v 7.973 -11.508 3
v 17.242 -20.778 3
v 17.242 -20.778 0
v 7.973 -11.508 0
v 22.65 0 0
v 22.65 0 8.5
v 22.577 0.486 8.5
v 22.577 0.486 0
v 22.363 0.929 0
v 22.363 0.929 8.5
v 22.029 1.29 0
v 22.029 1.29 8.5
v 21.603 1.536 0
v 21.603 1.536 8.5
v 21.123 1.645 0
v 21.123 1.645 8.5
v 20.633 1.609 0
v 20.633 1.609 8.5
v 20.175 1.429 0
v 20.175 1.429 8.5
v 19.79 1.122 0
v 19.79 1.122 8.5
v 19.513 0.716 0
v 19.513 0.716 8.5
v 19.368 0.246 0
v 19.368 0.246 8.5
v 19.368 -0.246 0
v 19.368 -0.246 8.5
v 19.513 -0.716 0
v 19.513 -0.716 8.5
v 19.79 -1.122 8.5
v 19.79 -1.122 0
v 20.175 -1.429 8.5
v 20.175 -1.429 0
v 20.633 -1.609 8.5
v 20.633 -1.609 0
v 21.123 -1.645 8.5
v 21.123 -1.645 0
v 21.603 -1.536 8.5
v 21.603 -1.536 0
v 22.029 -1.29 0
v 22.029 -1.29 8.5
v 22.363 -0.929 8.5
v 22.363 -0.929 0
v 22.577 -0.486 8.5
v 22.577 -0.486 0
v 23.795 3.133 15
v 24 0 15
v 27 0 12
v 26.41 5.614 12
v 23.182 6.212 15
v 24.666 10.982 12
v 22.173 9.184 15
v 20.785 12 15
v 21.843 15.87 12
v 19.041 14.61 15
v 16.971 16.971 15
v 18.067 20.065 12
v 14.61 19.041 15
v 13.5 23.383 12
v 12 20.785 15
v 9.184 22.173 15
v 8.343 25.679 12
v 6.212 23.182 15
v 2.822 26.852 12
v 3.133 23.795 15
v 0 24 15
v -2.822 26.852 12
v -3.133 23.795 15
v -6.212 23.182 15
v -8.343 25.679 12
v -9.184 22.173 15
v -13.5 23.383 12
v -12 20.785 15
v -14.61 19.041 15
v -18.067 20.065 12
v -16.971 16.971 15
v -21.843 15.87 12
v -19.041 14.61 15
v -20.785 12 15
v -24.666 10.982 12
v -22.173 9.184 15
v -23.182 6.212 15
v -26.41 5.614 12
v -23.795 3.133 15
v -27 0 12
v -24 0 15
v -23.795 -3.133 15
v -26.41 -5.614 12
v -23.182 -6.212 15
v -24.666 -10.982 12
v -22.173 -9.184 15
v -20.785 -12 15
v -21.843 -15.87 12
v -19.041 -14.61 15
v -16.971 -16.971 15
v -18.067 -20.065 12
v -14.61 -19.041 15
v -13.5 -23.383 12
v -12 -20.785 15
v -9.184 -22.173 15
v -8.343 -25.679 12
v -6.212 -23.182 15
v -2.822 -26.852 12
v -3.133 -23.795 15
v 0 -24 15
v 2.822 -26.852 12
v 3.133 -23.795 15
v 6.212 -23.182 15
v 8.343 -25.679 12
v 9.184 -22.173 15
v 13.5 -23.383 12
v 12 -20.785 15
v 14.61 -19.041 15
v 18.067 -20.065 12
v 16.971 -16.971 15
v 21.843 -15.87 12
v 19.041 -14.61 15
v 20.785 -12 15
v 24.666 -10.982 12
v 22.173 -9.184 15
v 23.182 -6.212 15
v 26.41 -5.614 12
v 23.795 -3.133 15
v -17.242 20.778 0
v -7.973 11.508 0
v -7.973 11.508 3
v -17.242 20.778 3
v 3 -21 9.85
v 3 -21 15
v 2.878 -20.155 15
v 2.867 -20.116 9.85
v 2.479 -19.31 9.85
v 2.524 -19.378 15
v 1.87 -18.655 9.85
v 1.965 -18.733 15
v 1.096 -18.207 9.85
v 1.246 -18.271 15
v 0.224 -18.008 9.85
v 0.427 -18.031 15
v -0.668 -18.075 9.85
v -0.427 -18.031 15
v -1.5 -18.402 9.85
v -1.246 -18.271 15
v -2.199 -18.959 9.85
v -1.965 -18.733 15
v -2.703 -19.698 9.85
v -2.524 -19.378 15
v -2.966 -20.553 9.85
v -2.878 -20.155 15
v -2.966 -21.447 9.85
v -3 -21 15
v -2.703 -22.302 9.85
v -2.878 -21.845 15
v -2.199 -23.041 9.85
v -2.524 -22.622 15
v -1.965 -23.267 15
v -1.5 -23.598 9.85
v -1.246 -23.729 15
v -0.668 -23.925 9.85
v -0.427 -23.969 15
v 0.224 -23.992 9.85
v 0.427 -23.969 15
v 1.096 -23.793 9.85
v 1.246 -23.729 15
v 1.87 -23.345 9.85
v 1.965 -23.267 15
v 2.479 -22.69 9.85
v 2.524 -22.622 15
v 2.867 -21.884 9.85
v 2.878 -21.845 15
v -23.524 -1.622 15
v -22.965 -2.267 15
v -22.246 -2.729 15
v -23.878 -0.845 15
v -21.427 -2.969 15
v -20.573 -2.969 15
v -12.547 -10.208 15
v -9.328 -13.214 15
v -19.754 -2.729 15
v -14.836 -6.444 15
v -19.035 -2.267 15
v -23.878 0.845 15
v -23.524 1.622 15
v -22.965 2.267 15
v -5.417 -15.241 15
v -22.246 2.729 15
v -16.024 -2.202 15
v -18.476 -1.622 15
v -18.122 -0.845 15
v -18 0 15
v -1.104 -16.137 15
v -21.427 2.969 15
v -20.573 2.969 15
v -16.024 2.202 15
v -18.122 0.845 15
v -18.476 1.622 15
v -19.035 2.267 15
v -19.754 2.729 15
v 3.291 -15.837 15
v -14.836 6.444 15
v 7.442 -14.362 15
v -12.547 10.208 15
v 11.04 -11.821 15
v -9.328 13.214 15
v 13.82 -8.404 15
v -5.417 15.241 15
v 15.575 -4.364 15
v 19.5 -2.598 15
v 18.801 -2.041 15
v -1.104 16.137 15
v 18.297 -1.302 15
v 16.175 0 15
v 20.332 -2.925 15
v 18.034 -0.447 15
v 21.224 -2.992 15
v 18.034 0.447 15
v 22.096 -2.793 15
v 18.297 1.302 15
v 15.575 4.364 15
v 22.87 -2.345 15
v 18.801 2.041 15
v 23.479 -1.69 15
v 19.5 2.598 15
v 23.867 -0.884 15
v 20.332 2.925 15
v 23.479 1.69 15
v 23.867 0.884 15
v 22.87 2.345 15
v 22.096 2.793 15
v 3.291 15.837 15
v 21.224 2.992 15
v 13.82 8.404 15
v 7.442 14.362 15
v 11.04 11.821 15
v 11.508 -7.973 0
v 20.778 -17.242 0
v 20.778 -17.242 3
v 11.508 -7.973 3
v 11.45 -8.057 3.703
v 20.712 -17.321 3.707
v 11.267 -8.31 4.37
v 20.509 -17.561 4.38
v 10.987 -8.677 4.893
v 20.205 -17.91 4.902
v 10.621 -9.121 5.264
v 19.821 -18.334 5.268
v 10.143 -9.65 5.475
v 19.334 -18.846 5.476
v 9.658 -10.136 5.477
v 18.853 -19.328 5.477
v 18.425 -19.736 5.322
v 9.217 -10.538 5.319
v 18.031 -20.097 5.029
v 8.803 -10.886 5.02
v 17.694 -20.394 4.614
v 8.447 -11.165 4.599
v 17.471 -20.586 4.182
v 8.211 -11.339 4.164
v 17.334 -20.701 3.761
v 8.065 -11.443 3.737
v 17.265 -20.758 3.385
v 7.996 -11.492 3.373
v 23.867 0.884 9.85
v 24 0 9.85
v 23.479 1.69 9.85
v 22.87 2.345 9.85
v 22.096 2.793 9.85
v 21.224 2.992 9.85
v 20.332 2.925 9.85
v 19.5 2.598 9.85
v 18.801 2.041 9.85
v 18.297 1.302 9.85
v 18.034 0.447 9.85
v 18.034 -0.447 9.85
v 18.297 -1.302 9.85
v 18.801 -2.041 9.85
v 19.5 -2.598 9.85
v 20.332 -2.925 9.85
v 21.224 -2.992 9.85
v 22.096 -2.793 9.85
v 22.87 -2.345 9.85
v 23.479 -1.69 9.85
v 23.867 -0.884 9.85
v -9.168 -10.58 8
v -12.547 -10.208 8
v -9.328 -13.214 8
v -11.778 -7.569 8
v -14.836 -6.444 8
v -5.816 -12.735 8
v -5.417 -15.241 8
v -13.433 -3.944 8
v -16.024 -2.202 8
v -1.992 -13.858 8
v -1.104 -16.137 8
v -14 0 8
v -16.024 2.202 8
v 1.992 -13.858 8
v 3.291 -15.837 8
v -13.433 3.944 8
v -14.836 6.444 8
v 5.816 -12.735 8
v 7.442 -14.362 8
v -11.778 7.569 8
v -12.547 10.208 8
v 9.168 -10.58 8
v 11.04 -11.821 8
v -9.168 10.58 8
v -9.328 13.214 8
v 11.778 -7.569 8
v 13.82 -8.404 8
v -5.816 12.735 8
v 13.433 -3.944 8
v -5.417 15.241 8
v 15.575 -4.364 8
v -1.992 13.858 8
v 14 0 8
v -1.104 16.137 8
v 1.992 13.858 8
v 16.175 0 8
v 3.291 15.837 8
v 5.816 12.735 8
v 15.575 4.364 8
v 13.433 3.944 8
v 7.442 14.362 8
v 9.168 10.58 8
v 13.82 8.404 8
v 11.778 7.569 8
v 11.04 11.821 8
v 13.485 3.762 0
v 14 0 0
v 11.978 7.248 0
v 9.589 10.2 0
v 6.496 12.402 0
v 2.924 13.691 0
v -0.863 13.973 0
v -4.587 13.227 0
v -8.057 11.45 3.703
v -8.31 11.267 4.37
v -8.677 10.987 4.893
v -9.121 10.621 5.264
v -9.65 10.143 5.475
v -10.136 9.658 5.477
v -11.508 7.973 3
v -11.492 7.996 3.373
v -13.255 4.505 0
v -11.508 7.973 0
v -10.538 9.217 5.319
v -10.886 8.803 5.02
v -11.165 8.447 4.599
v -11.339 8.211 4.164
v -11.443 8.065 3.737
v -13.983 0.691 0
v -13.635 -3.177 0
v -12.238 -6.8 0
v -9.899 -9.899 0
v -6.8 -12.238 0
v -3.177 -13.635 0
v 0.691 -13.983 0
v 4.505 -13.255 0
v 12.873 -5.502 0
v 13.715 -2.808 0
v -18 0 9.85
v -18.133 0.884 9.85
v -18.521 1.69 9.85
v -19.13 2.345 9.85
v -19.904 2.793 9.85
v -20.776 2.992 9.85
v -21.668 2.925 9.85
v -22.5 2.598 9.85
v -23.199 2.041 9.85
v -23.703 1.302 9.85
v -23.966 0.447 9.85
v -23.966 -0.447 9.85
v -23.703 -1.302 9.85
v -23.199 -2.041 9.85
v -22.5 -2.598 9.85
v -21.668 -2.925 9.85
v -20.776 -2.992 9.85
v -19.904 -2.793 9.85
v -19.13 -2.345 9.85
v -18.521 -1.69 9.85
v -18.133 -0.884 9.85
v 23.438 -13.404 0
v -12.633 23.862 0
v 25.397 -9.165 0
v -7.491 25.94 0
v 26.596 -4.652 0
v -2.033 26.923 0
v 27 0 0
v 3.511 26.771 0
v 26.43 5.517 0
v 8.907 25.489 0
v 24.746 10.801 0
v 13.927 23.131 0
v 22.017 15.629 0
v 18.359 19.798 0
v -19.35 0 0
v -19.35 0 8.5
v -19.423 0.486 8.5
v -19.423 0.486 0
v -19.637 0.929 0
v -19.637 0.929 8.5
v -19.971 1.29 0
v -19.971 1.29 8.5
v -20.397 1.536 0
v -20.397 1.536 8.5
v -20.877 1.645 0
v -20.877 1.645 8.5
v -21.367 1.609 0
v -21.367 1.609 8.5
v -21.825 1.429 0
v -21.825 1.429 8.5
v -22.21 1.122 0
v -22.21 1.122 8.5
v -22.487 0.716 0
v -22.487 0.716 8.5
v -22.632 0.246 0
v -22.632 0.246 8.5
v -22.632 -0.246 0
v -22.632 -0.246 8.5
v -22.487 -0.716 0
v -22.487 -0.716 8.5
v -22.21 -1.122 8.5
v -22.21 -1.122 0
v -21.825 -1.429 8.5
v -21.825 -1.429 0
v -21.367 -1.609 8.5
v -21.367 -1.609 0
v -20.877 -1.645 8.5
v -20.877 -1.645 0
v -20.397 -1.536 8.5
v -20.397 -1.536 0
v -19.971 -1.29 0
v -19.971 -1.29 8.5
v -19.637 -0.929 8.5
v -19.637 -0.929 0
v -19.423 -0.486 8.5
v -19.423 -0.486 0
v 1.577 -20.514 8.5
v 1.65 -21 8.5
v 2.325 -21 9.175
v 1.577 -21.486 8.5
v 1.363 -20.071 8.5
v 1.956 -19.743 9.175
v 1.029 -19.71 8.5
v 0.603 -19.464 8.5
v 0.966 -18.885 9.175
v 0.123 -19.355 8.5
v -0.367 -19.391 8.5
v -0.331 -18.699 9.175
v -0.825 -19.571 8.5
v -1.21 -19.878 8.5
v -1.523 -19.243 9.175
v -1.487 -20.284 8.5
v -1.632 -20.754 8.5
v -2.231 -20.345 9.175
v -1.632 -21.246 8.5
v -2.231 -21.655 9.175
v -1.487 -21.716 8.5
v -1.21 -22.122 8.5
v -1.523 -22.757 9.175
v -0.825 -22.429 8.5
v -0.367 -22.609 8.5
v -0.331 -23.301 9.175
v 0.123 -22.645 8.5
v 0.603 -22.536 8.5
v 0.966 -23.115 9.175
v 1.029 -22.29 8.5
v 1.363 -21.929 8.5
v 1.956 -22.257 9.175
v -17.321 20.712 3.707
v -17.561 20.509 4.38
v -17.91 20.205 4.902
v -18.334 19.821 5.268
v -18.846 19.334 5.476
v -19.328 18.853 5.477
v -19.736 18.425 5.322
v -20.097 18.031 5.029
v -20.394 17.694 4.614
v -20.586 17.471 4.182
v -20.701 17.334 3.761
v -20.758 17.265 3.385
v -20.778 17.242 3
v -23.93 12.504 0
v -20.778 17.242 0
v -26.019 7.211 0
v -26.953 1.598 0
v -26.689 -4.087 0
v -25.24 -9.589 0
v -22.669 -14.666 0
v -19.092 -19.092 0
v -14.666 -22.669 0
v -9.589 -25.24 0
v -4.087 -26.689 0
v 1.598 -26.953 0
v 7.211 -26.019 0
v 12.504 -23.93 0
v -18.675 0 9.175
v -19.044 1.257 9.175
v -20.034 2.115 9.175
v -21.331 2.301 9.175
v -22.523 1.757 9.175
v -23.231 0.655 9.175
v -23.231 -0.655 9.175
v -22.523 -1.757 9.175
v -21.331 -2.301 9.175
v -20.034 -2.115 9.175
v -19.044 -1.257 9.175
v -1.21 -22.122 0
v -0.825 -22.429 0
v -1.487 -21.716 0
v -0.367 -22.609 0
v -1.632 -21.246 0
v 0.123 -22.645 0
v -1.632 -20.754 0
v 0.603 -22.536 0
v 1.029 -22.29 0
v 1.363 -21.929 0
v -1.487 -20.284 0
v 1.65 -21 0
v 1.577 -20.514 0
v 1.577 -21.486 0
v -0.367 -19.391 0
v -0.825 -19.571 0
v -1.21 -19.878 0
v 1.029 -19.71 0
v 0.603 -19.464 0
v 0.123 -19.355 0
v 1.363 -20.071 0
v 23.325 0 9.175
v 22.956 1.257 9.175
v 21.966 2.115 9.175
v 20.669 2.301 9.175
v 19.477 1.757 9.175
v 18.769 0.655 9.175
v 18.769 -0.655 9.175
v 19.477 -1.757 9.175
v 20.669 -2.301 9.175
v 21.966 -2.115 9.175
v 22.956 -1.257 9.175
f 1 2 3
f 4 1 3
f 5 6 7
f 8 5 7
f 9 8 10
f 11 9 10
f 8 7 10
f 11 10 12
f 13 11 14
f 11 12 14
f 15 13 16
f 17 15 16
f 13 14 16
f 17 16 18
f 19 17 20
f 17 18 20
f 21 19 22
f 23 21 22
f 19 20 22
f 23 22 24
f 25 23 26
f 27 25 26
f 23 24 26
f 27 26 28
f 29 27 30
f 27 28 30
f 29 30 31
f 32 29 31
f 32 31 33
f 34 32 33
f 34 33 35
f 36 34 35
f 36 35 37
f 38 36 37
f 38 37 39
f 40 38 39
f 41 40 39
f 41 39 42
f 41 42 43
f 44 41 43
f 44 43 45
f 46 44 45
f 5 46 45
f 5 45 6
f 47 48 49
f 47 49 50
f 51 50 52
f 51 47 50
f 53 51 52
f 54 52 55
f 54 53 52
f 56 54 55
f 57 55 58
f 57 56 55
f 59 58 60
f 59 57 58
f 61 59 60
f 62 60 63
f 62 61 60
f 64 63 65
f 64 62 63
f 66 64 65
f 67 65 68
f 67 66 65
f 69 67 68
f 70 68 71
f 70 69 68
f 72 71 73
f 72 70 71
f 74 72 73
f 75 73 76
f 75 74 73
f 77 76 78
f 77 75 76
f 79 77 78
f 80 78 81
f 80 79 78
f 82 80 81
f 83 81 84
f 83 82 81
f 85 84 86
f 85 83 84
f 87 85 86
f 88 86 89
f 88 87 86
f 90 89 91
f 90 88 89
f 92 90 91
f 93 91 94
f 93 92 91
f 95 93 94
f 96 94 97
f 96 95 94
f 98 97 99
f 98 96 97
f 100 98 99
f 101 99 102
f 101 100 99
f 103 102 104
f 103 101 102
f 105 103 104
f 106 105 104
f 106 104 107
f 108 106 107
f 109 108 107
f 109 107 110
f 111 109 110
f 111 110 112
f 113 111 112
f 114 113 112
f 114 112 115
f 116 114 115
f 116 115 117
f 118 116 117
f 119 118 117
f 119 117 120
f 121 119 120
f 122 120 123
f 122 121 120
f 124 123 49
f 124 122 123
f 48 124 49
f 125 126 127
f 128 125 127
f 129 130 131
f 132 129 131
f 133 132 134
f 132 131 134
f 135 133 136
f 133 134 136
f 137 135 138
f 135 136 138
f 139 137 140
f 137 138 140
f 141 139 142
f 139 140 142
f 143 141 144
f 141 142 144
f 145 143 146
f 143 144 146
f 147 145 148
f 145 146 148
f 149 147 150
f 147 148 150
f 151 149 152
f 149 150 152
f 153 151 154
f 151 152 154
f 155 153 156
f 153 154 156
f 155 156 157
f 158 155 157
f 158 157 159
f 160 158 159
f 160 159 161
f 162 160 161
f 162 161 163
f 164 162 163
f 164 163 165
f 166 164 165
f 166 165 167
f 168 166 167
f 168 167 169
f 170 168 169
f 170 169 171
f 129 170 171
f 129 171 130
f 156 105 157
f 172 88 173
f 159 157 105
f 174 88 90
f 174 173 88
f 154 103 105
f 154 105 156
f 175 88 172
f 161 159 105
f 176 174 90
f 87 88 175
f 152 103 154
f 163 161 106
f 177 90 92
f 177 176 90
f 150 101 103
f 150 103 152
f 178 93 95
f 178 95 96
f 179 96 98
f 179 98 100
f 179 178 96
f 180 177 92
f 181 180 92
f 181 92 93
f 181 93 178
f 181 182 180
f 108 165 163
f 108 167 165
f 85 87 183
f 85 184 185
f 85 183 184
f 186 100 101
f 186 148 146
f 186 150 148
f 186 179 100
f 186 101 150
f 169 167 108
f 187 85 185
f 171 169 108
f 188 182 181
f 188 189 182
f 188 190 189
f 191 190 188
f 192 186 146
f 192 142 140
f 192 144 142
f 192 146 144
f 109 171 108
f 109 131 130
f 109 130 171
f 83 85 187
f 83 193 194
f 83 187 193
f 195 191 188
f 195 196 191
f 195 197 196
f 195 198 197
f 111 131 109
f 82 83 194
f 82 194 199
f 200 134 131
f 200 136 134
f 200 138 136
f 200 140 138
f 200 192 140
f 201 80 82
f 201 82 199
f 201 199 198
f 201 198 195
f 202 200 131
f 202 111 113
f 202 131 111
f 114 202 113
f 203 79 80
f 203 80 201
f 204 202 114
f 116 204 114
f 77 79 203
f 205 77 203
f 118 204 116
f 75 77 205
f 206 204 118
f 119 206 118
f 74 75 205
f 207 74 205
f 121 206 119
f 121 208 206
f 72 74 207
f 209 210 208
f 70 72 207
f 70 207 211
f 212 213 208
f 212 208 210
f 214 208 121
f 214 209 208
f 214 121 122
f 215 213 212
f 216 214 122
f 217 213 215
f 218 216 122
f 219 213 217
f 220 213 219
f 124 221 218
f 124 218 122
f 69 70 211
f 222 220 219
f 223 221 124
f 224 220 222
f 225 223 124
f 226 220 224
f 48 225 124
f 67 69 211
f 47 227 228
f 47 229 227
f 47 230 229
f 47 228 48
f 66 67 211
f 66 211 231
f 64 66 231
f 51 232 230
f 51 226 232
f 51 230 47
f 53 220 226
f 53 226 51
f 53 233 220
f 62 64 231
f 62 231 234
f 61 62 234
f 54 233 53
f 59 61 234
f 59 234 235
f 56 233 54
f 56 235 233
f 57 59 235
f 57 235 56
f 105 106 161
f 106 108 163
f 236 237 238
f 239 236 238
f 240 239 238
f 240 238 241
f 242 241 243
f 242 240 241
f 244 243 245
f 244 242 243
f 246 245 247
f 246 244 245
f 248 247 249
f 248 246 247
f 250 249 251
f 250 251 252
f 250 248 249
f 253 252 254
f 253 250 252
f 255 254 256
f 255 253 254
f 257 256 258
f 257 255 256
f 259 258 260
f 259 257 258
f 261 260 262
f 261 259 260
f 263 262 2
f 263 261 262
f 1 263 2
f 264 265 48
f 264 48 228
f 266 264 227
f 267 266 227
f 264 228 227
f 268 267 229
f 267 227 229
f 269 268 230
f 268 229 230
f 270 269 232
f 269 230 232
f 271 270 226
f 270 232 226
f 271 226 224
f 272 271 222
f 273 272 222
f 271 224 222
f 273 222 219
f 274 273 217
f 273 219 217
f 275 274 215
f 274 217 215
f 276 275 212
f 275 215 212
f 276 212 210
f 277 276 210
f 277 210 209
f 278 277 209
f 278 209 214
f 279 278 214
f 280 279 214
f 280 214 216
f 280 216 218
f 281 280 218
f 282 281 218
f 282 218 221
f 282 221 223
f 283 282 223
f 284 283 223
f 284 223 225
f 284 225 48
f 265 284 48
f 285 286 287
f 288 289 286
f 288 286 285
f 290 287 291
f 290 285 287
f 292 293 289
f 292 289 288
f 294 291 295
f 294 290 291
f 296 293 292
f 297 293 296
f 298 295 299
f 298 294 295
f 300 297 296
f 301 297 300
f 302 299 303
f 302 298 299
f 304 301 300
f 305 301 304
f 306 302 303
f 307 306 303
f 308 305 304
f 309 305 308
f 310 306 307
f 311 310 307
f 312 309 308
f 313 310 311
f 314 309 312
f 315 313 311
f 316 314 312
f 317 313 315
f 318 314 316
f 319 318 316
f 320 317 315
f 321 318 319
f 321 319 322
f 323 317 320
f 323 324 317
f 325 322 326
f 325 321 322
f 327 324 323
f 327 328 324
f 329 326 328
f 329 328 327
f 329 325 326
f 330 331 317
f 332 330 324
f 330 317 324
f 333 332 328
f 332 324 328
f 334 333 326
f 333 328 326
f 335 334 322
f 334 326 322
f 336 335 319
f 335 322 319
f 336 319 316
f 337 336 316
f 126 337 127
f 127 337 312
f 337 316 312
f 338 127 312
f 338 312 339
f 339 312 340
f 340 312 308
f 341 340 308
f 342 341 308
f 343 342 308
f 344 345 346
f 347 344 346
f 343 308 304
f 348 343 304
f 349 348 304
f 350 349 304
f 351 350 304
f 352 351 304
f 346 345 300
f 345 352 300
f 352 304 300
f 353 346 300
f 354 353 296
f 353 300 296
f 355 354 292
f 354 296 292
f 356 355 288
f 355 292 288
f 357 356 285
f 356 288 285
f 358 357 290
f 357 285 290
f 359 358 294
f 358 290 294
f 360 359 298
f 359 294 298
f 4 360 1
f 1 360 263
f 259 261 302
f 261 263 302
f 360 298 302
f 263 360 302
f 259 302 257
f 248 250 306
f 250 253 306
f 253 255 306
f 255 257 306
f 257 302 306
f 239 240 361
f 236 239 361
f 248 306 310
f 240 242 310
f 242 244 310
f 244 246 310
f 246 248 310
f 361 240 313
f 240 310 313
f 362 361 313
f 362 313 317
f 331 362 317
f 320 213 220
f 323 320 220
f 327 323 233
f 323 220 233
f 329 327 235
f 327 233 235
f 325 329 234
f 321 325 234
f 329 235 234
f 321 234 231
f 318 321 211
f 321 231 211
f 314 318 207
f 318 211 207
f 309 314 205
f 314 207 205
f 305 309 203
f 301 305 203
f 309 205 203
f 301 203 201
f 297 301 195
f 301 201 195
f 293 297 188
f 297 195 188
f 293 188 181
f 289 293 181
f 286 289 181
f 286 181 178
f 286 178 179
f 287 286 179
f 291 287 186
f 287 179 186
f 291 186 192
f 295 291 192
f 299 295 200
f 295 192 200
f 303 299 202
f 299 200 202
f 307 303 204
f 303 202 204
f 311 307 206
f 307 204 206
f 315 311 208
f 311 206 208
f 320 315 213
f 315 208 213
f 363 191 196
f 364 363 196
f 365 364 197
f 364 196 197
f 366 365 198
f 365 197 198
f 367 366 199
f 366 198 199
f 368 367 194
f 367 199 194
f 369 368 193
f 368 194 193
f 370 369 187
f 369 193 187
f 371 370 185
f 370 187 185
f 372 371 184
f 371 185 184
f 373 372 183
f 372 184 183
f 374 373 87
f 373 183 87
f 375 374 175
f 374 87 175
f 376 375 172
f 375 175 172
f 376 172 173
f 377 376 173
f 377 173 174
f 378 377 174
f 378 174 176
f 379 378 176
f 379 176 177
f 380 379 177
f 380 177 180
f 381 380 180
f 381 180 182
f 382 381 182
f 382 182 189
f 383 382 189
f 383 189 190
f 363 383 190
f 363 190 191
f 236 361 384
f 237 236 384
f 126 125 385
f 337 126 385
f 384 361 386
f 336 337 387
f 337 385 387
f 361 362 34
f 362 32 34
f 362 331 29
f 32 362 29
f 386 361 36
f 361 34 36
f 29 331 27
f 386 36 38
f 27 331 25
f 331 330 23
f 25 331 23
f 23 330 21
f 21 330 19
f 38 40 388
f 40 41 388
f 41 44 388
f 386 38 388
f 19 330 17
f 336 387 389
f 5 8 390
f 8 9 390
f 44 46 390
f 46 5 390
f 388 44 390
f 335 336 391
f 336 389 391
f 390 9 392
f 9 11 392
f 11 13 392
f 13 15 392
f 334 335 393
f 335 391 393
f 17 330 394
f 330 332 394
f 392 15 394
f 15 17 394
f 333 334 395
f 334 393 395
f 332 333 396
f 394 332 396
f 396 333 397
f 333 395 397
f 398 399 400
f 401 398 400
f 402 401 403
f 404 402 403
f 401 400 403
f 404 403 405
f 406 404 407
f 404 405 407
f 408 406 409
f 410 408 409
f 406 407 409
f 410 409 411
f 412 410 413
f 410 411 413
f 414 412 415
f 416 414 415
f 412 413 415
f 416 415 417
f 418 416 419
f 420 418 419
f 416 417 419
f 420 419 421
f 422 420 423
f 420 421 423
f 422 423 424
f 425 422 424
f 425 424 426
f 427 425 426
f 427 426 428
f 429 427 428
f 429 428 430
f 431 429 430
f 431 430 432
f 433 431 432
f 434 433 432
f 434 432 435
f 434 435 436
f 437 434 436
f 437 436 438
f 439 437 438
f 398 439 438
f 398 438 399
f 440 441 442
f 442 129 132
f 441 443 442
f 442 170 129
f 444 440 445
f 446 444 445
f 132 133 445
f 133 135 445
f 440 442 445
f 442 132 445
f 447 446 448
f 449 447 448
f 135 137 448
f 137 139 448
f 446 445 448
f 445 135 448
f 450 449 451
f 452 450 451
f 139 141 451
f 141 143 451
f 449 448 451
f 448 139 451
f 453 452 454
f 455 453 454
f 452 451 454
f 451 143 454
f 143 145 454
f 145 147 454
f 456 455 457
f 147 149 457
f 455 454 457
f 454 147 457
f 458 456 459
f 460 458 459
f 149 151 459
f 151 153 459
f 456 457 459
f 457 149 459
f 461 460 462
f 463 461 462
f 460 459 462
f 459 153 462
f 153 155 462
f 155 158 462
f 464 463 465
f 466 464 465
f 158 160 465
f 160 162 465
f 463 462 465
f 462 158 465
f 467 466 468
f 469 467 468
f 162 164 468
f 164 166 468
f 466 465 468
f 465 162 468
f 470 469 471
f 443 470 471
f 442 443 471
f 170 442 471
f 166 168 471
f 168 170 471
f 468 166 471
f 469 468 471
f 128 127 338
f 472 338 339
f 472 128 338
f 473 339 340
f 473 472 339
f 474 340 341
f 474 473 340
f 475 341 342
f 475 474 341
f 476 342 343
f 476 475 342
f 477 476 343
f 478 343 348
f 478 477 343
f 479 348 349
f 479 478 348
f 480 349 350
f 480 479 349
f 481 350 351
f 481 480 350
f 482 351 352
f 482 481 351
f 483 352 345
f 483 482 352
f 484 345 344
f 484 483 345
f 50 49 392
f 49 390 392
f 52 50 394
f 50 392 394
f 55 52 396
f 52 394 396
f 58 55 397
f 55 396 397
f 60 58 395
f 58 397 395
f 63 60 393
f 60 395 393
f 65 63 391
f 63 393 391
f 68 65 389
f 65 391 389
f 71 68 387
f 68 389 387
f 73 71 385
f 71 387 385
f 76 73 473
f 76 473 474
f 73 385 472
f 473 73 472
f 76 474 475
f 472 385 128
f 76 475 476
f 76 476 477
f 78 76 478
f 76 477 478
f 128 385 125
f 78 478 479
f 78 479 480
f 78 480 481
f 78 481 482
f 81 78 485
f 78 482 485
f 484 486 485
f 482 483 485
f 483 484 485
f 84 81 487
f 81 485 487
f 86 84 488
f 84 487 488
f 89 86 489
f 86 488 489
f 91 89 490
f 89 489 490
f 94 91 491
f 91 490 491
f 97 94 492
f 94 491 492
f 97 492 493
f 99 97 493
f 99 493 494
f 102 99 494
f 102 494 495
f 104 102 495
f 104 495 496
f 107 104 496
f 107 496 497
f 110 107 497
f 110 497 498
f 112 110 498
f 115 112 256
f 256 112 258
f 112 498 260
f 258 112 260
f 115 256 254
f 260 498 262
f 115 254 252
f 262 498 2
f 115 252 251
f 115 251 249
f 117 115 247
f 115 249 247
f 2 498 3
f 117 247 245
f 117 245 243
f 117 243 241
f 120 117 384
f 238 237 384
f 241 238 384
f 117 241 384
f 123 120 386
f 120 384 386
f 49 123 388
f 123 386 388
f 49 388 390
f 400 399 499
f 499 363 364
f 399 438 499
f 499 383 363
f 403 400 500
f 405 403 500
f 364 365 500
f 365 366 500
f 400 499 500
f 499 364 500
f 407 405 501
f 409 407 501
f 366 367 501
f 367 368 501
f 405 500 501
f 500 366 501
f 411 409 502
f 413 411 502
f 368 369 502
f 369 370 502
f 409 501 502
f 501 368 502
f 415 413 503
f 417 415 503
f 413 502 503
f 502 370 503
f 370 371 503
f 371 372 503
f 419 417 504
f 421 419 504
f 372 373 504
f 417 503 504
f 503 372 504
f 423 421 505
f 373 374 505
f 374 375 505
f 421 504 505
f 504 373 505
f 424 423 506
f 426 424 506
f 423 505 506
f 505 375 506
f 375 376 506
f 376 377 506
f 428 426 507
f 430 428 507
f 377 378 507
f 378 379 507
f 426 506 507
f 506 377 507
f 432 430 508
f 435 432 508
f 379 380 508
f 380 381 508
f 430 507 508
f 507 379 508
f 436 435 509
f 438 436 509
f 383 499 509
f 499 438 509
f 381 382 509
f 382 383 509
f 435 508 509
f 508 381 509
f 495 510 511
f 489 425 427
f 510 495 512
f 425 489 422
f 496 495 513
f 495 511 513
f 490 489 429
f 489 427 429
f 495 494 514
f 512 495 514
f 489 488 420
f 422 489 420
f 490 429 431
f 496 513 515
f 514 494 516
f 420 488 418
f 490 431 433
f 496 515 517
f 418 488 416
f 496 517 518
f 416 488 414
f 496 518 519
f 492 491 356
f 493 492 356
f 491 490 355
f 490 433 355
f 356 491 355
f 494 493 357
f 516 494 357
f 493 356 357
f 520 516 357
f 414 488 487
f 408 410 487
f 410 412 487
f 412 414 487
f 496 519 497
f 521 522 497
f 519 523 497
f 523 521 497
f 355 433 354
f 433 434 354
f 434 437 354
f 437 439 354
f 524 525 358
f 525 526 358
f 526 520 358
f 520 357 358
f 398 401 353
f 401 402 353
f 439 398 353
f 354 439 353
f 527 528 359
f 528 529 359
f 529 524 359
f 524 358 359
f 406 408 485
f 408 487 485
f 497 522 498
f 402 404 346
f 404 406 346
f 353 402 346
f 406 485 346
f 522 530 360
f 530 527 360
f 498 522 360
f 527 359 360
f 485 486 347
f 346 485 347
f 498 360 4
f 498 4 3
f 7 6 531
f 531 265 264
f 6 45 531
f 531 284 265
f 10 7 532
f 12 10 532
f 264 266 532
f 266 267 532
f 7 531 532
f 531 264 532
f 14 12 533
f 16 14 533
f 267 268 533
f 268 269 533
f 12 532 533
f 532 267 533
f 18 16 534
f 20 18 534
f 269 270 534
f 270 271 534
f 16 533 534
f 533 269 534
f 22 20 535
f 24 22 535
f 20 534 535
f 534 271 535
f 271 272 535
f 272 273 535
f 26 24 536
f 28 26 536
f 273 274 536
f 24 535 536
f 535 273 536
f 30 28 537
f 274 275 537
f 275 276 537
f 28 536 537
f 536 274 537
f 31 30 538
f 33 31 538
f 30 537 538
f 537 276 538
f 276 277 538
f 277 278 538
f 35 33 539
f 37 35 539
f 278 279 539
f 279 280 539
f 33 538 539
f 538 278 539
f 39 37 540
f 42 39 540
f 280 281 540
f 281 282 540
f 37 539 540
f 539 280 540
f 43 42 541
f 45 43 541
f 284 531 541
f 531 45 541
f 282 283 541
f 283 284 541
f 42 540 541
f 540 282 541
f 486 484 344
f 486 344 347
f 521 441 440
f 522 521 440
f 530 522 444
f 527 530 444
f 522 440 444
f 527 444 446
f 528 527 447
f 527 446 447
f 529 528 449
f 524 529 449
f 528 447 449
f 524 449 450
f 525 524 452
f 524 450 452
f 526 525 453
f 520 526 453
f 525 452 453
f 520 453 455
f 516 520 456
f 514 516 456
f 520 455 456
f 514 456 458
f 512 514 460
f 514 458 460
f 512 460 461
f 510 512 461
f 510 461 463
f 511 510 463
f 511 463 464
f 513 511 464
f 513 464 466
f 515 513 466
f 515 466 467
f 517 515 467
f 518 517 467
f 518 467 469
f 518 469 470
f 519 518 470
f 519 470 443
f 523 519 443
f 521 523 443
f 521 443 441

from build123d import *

# Parameters (mm, degrees)
SKETCH_1_R               = 27
EXTRUDE_415_DEPTH        = 15
SKETCH_2_R               = 16.175
CUT_EXTRUDE_558_DEPTH    = 7
SKETCH_3_R               = 14
CUT_EXTRUDE_649_DEPTH    = 40.012818406
SKETCH_5_R               = 1.65
CUT_EXTRUDE_974_DEPTH    = 42.024382994
SKETCH_6_R               = 3
CUT_EXTRUDE_1153_DEPTH   = 5
CHAMFER_1_SIZE           = 1.5
CHAMFER_2_SIZE           = 3
CUT_EXTRUDE_1_DEPTH      = 42.024382994
CUT_EXTRUDE_1_DEPTH_BACK = 42.024382994


# Some blends are built 0.0001 mm under size
with BuildPart() as part:
    # Эскиз1 → Extrude 415 (new body)
    with BuildSketch(Plane.XY):
        Circle(SKETCH_1_R)
    extrude(amount=EXTRUDE_415_DEPTH)

    # Эскиз2 → Cut-Extrude 558 (cut)
    with BuildSketch(Plane.XY.offset(15)):
        Circle(SKETCH_2_R)
    extrude(amount=-CUT_EXTRUDE_558_DEPTH, mode=Mode.SUBTRACT)

    # Эскиз3 → Cut-Extrude 649 (cut, through all)
    with BuildSketch(Plane.XY.offset(8)):
        Circle(SKETCH_3_R)
    extrude(amount=-CUT_EXTRUDE_649_DEPTH, mode=Mode.SUBTRACT)

    # Эскиз5 → Cut-Extrude 974 (cut, through all)
    with BuildSketch(Plane.XY.offset(15)):
        with Locations((-21, 0)):
            Circle(SKETCH_5_R)
        with Locations((21, 0)):
            Circle(SKETCH_5_R)
        with Locations((0, -21)):
            Circle(SKETCH_5_R)
    extrude(amount=-CUT_EXTRUDE_974_DEPTH, mode=Mode.SUBTRACT)

    # Эскиз6 → Cut-Extrude 1153 (cut)
    with BuildSketch(Plane.XY.offset(15)):
        with Locations((-21, 0)):
            Circle(SKETCH_6_R)
        with Locations((21, 0)):
            Circle(SKETCH_6_R)
        with Locations((0, -21)):
            Circle(SKETCH_6_R)
    extrude(amount=-CUT_EXTRUDE_1153_DEPTH, mode=Mode.SUBTRACT)

    # Фаска1
    # the kernel refuses this chamfer: 1.5 mm, written as the material it takes off along each edge
    with BuildSketch(Plane(origin=(0, -21, 10), x_dir=(1, 0, 0), z_dir=(0, -1, 0))) as chamfer_1_piece_1_section:
        Polygon((1.65, -CHAMFER_1_SIZE), (1.65 + CHAMFER_1_SIZE, 0), (1.65, 0), align=None)
    chamfer_1_piece_1 = revolve(axis=Axis((0, -21, 10), (0, 0, 1)), mode=Mode.PRIVATE)
    chamfer_1_piece_1 = chamfer_1_piece_1 & Plane(origin=(0, -21, 9.171694066), x_dir=(1, 0, 0), z_dir=(0, 0, 1)) * Cylinder(3, 13, mode=Mode.PRIVATE)
    add(chamfer_1_piece_1, mode=Mode.SUBTRACT)
    with BuildSketch(Plane(origin=(21, 0, 10), x_dir=(1, 0, 0), z_dir=(0, -1, 0))) as chamfer_1_piece_2_section:
        Polygon((1.65, -CHAMFER_1_SIZE), (1.65 + CHAMFER_1_SIZE, 0), (1.65, 0), align=None)
    chamfer_1_piece_2 = revolve(axis=Axis((21, 0, 10), (0, 0, 1)), mode=Mode.PRIVATE)
    chamfer_1_piece_2 = chamfer_1_piece_2 & Plane(origin=(21, 0, 9.171694066), x_dir=(1, 0, 0), z_dir=(0, 0, 1)) * Cylinder(3, 13, mode=Mode.PRIVATE)
    add(chamfer_1_piece_2, mode=Mode.SUBTRACT)
    with BuildSketch(Plane(origin=(-21, 0, 10), x_dir=(1, 0, 0), z_dir=(0, -1, 0))) as chamfer_1_piece_3_section:
        Polygon((1.65, -CHAMFER_1_SIZE), (1.65 + CHAMFER_1_SIZE, 0), (1.65, 0), align=None)
    chamfer_1_piece_3 = revolve(axis=Axis((-21, 0, 10), (0, 0, 1)), mode=Mode.PRIVATE)
    chamfer_1_piece_3 = chamfer_1_piece_3 & Plane(origin=(-21, 0, 9.171694066), x_dir=(1, 0, 0), z_dir=(0, 0, 1)) * Cylinder(3, 13, mode=Mode.PRIVATE)
    add(chamfer_1_piece_3, mode=Mode.SUBTRACT)

    # Фаска2
    chamfer_2_edges = [part.edges().sort_by_distance(p)[0] for p in [
        (-27, 0, 15),
    ]]
    chamfer(chamfer_2_edges, length=CHAMFER_2_SIZE - 0.0001)  # a hair under: the kernel refuses the full size

    # Эскиз7 → Вырез-Вытянуть1 (cut, two sides: drawn at the far end of the back side and taken through both)
    with BuildSketch(Plane(origin=(0, 0, 0), x_dir=(0, 0, -1), z_dir=(0.7071067811865511, -0.707106781186544, 0)).offset(-CUT_EXTRUDE_1_DEPTH_BACK)):
        with BuildLine():
            Line((0, 2.5), (-3, 2.5))
            ThreePointArc((-3, 2.5), (-5.5, 0), (-3, -2.5))
            Line((-3, -2.5), (0, -2.5))
            Line((0, -2.5), (0, 2.5))
        make_face()
    extrude(amount=CUT_EXTRUDE_1_DEPTH + CUT_EXTRUDE_1_DEPTH_BACK, mode=Mode.SUBTRACT)


solid = part.part
